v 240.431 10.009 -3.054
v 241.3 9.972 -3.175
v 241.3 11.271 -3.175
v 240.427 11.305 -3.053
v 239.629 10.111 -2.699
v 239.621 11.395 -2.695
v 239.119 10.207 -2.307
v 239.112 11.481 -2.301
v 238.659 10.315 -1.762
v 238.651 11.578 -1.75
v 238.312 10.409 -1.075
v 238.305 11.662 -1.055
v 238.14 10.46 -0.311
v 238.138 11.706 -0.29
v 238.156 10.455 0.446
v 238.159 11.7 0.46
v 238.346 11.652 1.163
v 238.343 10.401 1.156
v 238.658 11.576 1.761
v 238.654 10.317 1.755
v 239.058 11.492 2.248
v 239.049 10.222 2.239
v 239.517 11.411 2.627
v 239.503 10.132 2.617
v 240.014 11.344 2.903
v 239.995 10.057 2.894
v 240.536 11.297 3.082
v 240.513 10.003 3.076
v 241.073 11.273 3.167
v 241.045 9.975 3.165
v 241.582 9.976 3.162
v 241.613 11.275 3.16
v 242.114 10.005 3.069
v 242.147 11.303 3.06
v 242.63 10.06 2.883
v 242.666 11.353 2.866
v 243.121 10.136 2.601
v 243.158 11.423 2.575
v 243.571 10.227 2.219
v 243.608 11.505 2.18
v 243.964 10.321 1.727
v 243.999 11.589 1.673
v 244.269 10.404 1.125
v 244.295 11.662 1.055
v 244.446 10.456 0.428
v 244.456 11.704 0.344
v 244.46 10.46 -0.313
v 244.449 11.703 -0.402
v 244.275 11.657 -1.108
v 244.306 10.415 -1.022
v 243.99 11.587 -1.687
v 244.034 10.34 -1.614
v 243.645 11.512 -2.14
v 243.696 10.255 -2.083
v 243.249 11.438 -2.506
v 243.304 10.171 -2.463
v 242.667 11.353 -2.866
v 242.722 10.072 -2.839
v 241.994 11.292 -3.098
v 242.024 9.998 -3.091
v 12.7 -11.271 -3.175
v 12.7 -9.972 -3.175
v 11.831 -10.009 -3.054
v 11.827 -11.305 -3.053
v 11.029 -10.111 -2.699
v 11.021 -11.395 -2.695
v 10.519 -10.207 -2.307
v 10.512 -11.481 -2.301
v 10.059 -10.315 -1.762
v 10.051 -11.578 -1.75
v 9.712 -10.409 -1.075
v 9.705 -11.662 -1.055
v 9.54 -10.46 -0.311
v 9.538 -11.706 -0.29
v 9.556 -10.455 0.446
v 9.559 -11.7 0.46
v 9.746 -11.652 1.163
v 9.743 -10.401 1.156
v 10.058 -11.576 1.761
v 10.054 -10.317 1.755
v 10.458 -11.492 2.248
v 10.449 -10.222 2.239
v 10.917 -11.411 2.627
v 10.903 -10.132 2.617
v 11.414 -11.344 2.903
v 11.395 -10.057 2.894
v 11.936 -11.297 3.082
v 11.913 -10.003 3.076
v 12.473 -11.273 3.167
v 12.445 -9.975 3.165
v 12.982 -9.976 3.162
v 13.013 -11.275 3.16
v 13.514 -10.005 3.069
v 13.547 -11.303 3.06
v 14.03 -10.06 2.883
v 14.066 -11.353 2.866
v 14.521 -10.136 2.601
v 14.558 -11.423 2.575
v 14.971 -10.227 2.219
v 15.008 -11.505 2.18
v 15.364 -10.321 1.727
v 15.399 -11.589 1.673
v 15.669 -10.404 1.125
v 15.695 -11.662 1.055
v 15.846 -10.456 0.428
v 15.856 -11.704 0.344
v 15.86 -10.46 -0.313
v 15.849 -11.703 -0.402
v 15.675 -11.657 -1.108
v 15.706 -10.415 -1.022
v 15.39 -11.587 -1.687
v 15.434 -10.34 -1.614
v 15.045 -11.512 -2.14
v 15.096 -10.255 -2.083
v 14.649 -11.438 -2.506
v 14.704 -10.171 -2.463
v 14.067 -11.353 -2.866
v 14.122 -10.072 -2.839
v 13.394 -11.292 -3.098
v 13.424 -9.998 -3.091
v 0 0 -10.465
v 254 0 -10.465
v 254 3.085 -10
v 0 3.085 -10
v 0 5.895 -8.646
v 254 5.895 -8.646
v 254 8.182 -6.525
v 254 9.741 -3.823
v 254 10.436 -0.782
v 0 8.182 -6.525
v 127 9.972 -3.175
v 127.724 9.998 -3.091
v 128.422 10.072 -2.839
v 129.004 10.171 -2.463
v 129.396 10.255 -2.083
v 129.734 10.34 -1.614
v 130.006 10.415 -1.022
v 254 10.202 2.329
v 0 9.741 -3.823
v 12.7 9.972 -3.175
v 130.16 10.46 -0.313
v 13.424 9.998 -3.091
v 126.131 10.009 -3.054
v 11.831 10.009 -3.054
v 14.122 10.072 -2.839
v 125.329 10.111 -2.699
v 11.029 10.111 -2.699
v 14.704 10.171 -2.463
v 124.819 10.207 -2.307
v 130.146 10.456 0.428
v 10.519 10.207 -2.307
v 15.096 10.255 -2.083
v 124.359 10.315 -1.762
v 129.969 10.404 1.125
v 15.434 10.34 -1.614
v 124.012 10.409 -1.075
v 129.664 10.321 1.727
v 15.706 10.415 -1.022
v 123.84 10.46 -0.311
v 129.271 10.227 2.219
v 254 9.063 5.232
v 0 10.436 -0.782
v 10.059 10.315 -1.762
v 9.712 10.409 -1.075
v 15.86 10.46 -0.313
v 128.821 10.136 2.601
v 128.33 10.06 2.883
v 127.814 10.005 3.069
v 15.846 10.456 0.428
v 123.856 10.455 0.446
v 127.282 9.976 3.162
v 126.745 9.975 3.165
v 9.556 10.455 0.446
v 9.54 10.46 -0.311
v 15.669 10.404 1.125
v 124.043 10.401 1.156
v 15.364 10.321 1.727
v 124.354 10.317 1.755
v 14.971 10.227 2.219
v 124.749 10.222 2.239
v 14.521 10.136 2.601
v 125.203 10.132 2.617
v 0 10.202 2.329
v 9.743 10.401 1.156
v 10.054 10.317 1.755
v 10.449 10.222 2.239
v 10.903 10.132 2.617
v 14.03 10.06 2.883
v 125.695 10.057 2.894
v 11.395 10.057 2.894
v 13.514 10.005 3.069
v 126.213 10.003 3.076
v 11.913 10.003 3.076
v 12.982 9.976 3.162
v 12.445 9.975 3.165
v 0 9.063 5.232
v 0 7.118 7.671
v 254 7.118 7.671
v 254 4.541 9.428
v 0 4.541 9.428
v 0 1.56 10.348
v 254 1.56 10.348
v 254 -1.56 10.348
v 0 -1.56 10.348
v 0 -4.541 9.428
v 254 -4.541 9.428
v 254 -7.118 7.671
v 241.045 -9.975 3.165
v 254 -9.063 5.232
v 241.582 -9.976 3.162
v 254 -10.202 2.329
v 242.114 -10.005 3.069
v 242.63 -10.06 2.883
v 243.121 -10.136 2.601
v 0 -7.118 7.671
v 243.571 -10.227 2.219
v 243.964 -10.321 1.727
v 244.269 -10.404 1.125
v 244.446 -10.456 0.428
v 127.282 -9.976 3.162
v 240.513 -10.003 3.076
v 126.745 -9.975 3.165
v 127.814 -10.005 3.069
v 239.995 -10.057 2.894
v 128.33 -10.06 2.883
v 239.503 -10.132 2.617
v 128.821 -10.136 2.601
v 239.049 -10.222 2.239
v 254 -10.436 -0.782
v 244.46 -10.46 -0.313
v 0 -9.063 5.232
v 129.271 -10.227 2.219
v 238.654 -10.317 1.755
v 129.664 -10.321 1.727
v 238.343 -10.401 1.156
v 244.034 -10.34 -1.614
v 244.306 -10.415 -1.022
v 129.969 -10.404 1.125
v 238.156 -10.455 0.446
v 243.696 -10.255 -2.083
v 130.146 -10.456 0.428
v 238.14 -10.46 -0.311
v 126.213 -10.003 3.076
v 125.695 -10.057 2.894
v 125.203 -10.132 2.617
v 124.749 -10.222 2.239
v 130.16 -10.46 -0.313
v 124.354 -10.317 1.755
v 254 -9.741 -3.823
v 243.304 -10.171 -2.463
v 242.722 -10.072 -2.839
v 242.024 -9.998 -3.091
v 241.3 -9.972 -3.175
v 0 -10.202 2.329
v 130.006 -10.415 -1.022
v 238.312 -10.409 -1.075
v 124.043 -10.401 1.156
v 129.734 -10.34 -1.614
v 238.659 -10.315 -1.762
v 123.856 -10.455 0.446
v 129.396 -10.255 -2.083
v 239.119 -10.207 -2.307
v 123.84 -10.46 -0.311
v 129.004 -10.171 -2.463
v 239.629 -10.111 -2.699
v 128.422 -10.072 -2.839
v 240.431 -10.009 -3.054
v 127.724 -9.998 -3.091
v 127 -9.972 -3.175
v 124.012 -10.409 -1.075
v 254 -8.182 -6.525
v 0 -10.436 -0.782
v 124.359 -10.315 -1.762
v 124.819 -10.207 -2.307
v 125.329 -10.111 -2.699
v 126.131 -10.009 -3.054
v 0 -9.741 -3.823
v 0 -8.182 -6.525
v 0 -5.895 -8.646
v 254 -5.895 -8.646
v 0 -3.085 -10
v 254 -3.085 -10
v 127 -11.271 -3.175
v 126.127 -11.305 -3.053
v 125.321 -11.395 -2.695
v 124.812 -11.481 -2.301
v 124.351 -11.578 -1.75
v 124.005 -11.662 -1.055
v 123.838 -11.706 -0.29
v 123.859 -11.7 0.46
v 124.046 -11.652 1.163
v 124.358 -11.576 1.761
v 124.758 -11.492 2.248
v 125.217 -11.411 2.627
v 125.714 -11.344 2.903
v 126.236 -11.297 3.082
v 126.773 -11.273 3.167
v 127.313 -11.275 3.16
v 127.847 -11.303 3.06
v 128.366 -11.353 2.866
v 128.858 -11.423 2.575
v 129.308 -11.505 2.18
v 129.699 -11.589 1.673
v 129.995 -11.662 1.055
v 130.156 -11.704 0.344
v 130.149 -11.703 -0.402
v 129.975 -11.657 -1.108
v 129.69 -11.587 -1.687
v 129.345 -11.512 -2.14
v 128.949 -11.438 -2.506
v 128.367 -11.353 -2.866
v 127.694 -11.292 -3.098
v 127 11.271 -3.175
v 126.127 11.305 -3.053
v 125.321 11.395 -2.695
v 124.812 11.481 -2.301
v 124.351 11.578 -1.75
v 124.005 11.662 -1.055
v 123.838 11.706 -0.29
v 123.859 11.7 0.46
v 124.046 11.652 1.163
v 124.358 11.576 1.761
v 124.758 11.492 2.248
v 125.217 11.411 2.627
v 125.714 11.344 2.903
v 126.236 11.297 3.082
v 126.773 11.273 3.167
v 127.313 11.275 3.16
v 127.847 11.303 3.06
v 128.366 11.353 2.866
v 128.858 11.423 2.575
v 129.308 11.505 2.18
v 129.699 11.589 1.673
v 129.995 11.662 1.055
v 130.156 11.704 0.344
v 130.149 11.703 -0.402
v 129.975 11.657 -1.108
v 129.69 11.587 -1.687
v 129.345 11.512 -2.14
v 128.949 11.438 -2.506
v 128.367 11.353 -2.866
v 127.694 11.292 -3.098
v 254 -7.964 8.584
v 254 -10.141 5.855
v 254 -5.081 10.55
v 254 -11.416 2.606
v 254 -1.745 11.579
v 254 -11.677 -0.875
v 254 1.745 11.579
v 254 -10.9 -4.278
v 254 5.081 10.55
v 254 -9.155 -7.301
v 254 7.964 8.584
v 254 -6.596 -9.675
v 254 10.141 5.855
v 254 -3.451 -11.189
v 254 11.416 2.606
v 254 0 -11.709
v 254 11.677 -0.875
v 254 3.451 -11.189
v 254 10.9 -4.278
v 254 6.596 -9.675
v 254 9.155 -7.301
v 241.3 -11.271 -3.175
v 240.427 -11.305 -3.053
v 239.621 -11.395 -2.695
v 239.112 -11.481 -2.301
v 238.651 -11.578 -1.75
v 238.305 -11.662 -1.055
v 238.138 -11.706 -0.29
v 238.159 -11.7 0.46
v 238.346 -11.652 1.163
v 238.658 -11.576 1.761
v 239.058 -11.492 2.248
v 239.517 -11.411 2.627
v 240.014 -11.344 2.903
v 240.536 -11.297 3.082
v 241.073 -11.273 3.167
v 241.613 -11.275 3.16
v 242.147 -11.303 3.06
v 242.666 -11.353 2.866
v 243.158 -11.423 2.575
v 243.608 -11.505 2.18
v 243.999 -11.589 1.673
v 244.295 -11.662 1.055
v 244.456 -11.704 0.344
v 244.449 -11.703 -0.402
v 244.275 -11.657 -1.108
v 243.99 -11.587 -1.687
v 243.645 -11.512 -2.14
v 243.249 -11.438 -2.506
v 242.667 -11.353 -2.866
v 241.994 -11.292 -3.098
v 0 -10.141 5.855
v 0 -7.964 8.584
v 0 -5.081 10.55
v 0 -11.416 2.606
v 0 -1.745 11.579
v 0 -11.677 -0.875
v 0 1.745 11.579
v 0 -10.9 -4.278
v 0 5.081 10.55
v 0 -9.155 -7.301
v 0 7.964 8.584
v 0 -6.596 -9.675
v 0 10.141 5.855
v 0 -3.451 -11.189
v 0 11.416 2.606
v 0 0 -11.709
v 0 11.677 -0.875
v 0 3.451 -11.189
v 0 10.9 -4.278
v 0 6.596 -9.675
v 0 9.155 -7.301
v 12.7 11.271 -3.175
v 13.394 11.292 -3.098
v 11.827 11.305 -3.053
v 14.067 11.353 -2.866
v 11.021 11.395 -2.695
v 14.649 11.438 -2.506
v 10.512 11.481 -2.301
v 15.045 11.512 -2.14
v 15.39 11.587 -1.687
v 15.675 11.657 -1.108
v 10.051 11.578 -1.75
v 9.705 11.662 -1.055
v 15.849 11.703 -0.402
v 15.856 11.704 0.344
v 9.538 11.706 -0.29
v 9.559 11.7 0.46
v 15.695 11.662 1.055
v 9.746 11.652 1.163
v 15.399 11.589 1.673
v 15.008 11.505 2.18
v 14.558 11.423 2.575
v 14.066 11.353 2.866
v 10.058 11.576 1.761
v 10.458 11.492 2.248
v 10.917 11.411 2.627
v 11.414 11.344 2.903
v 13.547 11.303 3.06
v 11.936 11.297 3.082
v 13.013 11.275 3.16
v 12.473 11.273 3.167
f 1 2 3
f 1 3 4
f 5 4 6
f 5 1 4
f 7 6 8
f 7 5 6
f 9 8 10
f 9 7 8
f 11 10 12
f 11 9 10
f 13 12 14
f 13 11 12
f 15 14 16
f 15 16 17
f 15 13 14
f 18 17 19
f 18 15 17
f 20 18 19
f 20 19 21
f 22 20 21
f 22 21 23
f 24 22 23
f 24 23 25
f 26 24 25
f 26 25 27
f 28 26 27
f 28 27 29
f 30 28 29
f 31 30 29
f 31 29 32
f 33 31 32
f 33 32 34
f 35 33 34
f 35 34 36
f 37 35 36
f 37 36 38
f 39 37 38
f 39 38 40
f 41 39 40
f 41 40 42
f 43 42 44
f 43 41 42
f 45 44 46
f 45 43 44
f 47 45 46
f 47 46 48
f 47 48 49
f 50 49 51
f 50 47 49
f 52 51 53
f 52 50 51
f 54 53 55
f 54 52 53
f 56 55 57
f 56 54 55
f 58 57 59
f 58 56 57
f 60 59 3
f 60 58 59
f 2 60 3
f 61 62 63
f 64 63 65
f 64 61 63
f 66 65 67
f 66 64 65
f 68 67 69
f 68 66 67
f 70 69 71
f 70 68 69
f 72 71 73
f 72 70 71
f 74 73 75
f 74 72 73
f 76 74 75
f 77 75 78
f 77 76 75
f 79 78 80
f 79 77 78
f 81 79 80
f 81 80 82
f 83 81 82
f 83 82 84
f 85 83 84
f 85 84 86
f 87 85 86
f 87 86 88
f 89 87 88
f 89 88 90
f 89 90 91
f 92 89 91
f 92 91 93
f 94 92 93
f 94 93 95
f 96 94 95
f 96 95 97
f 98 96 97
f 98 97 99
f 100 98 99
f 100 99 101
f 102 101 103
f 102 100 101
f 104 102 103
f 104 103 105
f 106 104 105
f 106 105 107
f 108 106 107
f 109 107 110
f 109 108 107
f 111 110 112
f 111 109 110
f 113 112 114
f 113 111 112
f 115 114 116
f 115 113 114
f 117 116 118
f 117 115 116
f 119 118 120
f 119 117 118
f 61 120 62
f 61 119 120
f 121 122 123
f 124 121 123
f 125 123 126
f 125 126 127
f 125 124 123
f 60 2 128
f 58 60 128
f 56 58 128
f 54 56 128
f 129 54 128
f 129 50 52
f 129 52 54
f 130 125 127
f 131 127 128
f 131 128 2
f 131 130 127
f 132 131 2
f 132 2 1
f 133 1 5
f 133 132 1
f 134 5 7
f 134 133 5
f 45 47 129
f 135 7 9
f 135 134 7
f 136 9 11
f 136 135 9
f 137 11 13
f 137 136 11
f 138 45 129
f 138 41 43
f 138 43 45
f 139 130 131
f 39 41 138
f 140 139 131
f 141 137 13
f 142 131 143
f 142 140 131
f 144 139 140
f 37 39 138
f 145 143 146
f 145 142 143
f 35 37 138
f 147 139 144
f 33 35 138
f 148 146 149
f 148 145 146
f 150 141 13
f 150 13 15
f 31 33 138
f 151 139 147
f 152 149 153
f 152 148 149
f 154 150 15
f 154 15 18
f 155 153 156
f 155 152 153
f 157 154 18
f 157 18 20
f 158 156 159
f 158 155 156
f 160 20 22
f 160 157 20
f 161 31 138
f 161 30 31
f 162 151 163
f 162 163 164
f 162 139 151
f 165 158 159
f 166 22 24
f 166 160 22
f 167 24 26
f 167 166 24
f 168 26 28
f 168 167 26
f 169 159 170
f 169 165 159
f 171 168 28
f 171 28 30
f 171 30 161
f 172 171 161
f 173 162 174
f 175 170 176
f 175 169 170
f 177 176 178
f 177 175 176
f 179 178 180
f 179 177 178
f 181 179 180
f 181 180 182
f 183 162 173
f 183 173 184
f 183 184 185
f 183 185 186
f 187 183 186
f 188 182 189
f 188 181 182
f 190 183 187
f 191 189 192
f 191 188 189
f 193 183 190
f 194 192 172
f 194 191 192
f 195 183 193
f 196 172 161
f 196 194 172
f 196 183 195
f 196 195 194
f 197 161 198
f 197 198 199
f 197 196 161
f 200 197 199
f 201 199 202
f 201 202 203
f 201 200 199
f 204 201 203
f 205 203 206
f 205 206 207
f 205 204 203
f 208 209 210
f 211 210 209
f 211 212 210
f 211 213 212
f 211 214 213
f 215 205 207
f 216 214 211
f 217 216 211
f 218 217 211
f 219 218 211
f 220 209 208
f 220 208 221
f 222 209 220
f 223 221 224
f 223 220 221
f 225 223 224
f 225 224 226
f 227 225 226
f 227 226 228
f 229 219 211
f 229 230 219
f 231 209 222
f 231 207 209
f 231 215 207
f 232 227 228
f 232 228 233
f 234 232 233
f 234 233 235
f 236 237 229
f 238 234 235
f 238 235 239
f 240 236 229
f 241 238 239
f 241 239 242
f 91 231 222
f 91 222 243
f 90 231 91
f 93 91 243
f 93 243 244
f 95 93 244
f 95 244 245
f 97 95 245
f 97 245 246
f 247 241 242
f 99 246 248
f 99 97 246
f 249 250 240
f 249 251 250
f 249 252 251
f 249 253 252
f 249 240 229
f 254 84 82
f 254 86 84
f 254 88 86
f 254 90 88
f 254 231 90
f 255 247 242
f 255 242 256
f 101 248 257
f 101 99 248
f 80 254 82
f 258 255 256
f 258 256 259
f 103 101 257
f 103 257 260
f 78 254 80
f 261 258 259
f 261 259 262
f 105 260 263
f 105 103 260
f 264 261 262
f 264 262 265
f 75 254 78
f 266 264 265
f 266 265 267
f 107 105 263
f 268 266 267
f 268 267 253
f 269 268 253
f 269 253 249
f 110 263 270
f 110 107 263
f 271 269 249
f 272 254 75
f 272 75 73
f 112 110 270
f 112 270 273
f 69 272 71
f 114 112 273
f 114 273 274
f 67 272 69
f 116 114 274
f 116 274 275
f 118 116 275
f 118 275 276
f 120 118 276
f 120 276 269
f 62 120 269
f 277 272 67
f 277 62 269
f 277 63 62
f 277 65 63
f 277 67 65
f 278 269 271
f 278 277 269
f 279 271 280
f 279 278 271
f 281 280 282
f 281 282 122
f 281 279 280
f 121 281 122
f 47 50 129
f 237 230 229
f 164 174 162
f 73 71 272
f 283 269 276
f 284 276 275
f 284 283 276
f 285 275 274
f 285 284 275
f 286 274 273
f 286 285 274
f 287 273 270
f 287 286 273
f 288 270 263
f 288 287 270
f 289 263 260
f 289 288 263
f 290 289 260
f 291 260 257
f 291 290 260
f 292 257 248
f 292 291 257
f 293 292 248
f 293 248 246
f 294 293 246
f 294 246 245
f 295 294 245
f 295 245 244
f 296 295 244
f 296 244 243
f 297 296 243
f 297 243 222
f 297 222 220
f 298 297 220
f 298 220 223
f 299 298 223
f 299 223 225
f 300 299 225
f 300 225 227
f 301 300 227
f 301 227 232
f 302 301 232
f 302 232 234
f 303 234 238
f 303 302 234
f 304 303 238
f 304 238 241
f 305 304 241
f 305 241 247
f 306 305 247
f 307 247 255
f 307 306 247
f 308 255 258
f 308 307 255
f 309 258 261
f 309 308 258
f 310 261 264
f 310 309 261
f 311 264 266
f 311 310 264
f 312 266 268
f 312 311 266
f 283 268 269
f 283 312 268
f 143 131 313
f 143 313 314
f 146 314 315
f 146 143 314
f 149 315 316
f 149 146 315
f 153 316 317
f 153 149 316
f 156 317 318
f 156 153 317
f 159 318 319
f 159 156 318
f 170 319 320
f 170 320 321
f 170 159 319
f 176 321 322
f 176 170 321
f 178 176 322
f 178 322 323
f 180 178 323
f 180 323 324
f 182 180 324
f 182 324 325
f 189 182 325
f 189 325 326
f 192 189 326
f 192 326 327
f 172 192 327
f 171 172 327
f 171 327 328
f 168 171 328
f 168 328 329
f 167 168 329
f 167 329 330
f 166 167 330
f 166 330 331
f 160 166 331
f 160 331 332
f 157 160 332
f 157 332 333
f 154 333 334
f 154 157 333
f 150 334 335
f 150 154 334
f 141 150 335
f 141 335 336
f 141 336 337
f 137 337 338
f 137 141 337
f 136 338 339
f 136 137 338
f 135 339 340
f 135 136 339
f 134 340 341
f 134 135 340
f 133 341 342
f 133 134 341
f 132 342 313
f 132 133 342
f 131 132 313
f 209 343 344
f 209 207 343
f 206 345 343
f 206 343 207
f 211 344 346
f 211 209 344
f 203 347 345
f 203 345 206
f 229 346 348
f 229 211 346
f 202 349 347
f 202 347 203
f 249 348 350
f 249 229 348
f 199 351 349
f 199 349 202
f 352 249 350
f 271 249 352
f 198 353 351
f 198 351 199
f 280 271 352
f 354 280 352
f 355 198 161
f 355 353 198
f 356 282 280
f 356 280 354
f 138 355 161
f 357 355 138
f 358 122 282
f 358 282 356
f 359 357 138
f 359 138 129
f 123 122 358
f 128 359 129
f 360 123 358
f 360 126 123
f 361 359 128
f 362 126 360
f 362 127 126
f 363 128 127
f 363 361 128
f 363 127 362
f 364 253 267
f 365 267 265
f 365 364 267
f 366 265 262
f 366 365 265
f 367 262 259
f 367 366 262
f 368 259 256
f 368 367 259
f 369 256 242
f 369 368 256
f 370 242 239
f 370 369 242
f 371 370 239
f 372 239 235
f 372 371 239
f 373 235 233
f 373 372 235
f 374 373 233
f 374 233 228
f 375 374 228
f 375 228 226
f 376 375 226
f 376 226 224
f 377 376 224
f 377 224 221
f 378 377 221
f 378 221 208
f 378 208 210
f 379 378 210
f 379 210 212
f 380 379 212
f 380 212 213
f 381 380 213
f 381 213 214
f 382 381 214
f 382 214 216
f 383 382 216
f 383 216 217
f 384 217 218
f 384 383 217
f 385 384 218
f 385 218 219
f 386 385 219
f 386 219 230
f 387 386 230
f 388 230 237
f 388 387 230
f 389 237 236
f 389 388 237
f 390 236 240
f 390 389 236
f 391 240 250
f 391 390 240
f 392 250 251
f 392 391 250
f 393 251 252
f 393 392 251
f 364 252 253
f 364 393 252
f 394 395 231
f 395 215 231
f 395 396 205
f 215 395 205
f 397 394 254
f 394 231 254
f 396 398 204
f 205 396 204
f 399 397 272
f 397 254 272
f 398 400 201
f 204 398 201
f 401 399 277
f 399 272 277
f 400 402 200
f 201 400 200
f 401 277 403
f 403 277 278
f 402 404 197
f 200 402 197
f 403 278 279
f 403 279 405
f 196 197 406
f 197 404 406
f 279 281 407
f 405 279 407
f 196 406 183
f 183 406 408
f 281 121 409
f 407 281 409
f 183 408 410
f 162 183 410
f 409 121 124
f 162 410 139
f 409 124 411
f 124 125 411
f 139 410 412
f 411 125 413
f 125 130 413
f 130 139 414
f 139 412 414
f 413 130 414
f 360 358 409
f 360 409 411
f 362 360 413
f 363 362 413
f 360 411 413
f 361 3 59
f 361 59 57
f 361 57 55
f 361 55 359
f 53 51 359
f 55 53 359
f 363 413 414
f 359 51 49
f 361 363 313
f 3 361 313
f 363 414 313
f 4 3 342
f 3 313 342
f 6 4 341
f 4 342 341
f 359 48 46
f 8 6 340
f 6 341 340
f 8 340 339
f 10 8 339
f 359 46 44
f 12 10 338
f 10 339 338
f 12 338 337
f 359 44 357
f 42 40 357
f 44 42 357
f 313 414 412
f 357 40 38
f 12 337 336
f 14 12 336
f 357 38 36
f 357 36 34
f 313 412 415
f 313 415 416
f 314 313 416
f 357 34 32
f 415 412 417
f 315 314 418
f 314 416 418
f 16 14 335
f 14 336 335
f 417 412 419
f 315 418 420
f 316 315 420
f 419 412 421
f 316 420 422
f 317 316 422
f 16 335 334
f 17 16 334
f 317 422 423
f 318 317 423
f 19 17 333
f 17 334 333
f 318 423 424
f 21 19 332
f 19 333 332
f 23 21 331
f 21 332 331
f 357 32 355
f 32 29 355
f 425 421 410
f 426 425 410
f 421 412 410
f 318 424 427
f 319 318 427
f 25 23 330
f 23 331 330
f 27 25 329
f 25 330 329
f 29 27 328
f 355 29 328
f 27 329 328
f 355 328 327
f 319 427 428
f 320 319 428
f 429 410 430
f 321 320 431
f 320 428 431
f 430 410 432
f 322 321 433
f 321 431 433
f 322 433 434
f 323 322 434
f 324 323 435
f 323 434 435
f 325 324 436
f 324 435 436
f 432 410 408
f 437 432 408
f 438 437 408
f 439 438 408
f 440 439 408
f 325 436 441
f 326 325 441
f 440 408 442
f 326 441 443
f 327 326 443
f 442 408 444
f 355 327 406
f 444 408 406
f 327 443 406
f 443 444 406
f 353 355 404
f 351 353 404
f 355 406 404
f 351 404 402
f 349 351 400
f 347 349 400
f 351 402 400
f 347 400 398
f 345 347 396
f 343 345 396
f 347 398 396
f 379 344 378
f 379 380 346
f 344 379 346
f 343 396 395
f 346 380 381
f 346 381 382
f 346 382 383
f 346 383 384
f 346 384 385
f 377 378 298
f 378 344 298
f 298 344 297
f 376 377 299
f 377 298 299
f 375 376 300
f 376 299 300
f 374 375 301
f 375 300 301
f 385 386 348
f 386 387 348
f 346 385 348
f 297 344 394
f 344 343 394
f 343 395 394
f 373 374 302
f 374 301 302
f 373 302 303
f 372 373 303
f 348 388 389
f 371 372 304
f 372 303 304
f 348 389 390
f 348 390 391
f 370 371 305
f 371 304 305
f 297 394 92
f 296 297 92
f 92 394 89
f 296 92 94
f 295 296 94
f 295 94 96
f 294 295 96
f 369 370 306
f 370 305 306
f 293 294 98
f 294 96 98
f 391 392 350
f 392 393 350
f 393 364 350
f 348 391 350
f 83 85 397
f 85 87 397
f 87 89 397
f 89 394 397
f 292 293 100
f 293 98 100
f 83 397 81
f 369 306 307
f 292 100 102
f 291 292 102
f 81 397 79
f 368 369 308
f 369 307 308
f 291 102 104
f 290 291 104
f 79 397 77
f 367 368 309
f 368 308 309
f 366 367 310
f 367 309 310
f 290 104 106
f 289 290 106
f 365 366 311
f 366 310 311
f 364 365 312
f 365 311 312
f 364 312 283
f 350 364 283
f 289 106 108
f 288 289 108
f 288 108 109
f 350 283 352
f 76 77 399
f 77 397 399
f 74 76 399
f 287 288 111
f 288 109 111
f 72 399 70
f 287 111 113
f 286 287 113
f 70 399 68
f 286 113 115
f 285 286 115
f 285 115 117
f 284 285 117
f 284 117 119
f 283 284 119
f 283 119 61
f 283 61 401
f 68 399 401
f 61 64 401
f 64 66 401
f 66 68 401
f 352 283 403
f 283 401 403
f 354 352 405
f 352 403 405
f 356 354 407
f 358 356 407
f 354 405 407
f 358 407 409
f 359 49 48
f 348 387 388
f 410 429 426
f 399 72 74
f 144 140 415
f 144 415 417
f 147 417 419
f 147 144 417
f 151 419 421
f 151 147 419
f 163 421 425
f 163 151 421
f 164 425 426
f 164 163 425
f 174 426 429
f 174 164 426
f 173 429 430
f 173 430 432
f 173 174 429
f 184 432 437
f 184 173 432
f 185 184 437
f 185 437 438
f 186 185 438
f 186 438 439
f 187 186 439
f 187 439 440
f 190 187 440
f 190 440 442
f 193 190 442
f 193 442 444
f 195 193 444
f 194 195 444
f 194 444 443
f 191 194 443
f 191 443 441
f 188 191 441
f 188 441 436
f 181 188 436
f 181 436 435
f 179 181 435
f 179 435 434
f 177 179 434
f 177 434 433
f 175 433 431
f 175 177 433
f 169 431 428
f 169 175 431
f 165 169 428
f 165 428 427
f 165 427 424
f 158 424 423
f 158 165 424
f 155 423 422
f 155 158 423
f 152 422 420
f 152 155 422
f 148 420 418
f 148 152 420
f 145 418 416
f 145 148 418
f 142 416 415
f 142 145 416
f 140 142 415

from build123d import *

# Parameters (mm, degrees)
SKETCH3_R               = 11.7094
SKETCH3_R_2             = 10.4648
BOSS_EXTRUDE1_DEPTH     = 254
CUT_EXTRUDE1_DEPTH      = 255.539230958
CUT_EXTRUDE1_DEPTH_BACK = 255.539230958
SKETCH4_R               = 3.175


with BuildPart() as part:
    # Sketch3 → Boss-Extrude1 (new body)
    with BuildSketch(Plane(origin=(0, 0, 0), x_dir=(0, 0, -1), z_dir=(1, 0, 0))):
        Circle(SKETCH3_R)
        Circle(SKETCH3_R_2, mode=Mode.SUBTRACT)
    extrude(amount=BOSS_EXTRUDE1_DEPTH)

    # Sketch4 → Cut-Extrude1 (cut, two sides: drawn at the far end of the back side and taken through both)
    with BuildSketch(Plane(origin=(0, 0, 0), x_dir=(1, 0, 0), z_dir=(0, 1, 0)).offset(-CUT_EXTRUDE1_DEPTH_BACK)):
        with Locations(Location((127, 0, 0), (0, 0, 90))):
            Circle(SKETCH4_R)
        with Locations(Location((12.7, 0, 0), (0, 0, 90))):
            Circle(SKETCH4_R)
        with Locations(Location((241.3, 0, 0), (0, 0, 90))):
            Circle(SKETCH4_R)
    extrude(amount=CUT_EXTRUDE1_DEPTH + CUT_EXTRUDE1_DEPTH_BACK, mode=Mode.SUBTRACT)


solid = part.part
